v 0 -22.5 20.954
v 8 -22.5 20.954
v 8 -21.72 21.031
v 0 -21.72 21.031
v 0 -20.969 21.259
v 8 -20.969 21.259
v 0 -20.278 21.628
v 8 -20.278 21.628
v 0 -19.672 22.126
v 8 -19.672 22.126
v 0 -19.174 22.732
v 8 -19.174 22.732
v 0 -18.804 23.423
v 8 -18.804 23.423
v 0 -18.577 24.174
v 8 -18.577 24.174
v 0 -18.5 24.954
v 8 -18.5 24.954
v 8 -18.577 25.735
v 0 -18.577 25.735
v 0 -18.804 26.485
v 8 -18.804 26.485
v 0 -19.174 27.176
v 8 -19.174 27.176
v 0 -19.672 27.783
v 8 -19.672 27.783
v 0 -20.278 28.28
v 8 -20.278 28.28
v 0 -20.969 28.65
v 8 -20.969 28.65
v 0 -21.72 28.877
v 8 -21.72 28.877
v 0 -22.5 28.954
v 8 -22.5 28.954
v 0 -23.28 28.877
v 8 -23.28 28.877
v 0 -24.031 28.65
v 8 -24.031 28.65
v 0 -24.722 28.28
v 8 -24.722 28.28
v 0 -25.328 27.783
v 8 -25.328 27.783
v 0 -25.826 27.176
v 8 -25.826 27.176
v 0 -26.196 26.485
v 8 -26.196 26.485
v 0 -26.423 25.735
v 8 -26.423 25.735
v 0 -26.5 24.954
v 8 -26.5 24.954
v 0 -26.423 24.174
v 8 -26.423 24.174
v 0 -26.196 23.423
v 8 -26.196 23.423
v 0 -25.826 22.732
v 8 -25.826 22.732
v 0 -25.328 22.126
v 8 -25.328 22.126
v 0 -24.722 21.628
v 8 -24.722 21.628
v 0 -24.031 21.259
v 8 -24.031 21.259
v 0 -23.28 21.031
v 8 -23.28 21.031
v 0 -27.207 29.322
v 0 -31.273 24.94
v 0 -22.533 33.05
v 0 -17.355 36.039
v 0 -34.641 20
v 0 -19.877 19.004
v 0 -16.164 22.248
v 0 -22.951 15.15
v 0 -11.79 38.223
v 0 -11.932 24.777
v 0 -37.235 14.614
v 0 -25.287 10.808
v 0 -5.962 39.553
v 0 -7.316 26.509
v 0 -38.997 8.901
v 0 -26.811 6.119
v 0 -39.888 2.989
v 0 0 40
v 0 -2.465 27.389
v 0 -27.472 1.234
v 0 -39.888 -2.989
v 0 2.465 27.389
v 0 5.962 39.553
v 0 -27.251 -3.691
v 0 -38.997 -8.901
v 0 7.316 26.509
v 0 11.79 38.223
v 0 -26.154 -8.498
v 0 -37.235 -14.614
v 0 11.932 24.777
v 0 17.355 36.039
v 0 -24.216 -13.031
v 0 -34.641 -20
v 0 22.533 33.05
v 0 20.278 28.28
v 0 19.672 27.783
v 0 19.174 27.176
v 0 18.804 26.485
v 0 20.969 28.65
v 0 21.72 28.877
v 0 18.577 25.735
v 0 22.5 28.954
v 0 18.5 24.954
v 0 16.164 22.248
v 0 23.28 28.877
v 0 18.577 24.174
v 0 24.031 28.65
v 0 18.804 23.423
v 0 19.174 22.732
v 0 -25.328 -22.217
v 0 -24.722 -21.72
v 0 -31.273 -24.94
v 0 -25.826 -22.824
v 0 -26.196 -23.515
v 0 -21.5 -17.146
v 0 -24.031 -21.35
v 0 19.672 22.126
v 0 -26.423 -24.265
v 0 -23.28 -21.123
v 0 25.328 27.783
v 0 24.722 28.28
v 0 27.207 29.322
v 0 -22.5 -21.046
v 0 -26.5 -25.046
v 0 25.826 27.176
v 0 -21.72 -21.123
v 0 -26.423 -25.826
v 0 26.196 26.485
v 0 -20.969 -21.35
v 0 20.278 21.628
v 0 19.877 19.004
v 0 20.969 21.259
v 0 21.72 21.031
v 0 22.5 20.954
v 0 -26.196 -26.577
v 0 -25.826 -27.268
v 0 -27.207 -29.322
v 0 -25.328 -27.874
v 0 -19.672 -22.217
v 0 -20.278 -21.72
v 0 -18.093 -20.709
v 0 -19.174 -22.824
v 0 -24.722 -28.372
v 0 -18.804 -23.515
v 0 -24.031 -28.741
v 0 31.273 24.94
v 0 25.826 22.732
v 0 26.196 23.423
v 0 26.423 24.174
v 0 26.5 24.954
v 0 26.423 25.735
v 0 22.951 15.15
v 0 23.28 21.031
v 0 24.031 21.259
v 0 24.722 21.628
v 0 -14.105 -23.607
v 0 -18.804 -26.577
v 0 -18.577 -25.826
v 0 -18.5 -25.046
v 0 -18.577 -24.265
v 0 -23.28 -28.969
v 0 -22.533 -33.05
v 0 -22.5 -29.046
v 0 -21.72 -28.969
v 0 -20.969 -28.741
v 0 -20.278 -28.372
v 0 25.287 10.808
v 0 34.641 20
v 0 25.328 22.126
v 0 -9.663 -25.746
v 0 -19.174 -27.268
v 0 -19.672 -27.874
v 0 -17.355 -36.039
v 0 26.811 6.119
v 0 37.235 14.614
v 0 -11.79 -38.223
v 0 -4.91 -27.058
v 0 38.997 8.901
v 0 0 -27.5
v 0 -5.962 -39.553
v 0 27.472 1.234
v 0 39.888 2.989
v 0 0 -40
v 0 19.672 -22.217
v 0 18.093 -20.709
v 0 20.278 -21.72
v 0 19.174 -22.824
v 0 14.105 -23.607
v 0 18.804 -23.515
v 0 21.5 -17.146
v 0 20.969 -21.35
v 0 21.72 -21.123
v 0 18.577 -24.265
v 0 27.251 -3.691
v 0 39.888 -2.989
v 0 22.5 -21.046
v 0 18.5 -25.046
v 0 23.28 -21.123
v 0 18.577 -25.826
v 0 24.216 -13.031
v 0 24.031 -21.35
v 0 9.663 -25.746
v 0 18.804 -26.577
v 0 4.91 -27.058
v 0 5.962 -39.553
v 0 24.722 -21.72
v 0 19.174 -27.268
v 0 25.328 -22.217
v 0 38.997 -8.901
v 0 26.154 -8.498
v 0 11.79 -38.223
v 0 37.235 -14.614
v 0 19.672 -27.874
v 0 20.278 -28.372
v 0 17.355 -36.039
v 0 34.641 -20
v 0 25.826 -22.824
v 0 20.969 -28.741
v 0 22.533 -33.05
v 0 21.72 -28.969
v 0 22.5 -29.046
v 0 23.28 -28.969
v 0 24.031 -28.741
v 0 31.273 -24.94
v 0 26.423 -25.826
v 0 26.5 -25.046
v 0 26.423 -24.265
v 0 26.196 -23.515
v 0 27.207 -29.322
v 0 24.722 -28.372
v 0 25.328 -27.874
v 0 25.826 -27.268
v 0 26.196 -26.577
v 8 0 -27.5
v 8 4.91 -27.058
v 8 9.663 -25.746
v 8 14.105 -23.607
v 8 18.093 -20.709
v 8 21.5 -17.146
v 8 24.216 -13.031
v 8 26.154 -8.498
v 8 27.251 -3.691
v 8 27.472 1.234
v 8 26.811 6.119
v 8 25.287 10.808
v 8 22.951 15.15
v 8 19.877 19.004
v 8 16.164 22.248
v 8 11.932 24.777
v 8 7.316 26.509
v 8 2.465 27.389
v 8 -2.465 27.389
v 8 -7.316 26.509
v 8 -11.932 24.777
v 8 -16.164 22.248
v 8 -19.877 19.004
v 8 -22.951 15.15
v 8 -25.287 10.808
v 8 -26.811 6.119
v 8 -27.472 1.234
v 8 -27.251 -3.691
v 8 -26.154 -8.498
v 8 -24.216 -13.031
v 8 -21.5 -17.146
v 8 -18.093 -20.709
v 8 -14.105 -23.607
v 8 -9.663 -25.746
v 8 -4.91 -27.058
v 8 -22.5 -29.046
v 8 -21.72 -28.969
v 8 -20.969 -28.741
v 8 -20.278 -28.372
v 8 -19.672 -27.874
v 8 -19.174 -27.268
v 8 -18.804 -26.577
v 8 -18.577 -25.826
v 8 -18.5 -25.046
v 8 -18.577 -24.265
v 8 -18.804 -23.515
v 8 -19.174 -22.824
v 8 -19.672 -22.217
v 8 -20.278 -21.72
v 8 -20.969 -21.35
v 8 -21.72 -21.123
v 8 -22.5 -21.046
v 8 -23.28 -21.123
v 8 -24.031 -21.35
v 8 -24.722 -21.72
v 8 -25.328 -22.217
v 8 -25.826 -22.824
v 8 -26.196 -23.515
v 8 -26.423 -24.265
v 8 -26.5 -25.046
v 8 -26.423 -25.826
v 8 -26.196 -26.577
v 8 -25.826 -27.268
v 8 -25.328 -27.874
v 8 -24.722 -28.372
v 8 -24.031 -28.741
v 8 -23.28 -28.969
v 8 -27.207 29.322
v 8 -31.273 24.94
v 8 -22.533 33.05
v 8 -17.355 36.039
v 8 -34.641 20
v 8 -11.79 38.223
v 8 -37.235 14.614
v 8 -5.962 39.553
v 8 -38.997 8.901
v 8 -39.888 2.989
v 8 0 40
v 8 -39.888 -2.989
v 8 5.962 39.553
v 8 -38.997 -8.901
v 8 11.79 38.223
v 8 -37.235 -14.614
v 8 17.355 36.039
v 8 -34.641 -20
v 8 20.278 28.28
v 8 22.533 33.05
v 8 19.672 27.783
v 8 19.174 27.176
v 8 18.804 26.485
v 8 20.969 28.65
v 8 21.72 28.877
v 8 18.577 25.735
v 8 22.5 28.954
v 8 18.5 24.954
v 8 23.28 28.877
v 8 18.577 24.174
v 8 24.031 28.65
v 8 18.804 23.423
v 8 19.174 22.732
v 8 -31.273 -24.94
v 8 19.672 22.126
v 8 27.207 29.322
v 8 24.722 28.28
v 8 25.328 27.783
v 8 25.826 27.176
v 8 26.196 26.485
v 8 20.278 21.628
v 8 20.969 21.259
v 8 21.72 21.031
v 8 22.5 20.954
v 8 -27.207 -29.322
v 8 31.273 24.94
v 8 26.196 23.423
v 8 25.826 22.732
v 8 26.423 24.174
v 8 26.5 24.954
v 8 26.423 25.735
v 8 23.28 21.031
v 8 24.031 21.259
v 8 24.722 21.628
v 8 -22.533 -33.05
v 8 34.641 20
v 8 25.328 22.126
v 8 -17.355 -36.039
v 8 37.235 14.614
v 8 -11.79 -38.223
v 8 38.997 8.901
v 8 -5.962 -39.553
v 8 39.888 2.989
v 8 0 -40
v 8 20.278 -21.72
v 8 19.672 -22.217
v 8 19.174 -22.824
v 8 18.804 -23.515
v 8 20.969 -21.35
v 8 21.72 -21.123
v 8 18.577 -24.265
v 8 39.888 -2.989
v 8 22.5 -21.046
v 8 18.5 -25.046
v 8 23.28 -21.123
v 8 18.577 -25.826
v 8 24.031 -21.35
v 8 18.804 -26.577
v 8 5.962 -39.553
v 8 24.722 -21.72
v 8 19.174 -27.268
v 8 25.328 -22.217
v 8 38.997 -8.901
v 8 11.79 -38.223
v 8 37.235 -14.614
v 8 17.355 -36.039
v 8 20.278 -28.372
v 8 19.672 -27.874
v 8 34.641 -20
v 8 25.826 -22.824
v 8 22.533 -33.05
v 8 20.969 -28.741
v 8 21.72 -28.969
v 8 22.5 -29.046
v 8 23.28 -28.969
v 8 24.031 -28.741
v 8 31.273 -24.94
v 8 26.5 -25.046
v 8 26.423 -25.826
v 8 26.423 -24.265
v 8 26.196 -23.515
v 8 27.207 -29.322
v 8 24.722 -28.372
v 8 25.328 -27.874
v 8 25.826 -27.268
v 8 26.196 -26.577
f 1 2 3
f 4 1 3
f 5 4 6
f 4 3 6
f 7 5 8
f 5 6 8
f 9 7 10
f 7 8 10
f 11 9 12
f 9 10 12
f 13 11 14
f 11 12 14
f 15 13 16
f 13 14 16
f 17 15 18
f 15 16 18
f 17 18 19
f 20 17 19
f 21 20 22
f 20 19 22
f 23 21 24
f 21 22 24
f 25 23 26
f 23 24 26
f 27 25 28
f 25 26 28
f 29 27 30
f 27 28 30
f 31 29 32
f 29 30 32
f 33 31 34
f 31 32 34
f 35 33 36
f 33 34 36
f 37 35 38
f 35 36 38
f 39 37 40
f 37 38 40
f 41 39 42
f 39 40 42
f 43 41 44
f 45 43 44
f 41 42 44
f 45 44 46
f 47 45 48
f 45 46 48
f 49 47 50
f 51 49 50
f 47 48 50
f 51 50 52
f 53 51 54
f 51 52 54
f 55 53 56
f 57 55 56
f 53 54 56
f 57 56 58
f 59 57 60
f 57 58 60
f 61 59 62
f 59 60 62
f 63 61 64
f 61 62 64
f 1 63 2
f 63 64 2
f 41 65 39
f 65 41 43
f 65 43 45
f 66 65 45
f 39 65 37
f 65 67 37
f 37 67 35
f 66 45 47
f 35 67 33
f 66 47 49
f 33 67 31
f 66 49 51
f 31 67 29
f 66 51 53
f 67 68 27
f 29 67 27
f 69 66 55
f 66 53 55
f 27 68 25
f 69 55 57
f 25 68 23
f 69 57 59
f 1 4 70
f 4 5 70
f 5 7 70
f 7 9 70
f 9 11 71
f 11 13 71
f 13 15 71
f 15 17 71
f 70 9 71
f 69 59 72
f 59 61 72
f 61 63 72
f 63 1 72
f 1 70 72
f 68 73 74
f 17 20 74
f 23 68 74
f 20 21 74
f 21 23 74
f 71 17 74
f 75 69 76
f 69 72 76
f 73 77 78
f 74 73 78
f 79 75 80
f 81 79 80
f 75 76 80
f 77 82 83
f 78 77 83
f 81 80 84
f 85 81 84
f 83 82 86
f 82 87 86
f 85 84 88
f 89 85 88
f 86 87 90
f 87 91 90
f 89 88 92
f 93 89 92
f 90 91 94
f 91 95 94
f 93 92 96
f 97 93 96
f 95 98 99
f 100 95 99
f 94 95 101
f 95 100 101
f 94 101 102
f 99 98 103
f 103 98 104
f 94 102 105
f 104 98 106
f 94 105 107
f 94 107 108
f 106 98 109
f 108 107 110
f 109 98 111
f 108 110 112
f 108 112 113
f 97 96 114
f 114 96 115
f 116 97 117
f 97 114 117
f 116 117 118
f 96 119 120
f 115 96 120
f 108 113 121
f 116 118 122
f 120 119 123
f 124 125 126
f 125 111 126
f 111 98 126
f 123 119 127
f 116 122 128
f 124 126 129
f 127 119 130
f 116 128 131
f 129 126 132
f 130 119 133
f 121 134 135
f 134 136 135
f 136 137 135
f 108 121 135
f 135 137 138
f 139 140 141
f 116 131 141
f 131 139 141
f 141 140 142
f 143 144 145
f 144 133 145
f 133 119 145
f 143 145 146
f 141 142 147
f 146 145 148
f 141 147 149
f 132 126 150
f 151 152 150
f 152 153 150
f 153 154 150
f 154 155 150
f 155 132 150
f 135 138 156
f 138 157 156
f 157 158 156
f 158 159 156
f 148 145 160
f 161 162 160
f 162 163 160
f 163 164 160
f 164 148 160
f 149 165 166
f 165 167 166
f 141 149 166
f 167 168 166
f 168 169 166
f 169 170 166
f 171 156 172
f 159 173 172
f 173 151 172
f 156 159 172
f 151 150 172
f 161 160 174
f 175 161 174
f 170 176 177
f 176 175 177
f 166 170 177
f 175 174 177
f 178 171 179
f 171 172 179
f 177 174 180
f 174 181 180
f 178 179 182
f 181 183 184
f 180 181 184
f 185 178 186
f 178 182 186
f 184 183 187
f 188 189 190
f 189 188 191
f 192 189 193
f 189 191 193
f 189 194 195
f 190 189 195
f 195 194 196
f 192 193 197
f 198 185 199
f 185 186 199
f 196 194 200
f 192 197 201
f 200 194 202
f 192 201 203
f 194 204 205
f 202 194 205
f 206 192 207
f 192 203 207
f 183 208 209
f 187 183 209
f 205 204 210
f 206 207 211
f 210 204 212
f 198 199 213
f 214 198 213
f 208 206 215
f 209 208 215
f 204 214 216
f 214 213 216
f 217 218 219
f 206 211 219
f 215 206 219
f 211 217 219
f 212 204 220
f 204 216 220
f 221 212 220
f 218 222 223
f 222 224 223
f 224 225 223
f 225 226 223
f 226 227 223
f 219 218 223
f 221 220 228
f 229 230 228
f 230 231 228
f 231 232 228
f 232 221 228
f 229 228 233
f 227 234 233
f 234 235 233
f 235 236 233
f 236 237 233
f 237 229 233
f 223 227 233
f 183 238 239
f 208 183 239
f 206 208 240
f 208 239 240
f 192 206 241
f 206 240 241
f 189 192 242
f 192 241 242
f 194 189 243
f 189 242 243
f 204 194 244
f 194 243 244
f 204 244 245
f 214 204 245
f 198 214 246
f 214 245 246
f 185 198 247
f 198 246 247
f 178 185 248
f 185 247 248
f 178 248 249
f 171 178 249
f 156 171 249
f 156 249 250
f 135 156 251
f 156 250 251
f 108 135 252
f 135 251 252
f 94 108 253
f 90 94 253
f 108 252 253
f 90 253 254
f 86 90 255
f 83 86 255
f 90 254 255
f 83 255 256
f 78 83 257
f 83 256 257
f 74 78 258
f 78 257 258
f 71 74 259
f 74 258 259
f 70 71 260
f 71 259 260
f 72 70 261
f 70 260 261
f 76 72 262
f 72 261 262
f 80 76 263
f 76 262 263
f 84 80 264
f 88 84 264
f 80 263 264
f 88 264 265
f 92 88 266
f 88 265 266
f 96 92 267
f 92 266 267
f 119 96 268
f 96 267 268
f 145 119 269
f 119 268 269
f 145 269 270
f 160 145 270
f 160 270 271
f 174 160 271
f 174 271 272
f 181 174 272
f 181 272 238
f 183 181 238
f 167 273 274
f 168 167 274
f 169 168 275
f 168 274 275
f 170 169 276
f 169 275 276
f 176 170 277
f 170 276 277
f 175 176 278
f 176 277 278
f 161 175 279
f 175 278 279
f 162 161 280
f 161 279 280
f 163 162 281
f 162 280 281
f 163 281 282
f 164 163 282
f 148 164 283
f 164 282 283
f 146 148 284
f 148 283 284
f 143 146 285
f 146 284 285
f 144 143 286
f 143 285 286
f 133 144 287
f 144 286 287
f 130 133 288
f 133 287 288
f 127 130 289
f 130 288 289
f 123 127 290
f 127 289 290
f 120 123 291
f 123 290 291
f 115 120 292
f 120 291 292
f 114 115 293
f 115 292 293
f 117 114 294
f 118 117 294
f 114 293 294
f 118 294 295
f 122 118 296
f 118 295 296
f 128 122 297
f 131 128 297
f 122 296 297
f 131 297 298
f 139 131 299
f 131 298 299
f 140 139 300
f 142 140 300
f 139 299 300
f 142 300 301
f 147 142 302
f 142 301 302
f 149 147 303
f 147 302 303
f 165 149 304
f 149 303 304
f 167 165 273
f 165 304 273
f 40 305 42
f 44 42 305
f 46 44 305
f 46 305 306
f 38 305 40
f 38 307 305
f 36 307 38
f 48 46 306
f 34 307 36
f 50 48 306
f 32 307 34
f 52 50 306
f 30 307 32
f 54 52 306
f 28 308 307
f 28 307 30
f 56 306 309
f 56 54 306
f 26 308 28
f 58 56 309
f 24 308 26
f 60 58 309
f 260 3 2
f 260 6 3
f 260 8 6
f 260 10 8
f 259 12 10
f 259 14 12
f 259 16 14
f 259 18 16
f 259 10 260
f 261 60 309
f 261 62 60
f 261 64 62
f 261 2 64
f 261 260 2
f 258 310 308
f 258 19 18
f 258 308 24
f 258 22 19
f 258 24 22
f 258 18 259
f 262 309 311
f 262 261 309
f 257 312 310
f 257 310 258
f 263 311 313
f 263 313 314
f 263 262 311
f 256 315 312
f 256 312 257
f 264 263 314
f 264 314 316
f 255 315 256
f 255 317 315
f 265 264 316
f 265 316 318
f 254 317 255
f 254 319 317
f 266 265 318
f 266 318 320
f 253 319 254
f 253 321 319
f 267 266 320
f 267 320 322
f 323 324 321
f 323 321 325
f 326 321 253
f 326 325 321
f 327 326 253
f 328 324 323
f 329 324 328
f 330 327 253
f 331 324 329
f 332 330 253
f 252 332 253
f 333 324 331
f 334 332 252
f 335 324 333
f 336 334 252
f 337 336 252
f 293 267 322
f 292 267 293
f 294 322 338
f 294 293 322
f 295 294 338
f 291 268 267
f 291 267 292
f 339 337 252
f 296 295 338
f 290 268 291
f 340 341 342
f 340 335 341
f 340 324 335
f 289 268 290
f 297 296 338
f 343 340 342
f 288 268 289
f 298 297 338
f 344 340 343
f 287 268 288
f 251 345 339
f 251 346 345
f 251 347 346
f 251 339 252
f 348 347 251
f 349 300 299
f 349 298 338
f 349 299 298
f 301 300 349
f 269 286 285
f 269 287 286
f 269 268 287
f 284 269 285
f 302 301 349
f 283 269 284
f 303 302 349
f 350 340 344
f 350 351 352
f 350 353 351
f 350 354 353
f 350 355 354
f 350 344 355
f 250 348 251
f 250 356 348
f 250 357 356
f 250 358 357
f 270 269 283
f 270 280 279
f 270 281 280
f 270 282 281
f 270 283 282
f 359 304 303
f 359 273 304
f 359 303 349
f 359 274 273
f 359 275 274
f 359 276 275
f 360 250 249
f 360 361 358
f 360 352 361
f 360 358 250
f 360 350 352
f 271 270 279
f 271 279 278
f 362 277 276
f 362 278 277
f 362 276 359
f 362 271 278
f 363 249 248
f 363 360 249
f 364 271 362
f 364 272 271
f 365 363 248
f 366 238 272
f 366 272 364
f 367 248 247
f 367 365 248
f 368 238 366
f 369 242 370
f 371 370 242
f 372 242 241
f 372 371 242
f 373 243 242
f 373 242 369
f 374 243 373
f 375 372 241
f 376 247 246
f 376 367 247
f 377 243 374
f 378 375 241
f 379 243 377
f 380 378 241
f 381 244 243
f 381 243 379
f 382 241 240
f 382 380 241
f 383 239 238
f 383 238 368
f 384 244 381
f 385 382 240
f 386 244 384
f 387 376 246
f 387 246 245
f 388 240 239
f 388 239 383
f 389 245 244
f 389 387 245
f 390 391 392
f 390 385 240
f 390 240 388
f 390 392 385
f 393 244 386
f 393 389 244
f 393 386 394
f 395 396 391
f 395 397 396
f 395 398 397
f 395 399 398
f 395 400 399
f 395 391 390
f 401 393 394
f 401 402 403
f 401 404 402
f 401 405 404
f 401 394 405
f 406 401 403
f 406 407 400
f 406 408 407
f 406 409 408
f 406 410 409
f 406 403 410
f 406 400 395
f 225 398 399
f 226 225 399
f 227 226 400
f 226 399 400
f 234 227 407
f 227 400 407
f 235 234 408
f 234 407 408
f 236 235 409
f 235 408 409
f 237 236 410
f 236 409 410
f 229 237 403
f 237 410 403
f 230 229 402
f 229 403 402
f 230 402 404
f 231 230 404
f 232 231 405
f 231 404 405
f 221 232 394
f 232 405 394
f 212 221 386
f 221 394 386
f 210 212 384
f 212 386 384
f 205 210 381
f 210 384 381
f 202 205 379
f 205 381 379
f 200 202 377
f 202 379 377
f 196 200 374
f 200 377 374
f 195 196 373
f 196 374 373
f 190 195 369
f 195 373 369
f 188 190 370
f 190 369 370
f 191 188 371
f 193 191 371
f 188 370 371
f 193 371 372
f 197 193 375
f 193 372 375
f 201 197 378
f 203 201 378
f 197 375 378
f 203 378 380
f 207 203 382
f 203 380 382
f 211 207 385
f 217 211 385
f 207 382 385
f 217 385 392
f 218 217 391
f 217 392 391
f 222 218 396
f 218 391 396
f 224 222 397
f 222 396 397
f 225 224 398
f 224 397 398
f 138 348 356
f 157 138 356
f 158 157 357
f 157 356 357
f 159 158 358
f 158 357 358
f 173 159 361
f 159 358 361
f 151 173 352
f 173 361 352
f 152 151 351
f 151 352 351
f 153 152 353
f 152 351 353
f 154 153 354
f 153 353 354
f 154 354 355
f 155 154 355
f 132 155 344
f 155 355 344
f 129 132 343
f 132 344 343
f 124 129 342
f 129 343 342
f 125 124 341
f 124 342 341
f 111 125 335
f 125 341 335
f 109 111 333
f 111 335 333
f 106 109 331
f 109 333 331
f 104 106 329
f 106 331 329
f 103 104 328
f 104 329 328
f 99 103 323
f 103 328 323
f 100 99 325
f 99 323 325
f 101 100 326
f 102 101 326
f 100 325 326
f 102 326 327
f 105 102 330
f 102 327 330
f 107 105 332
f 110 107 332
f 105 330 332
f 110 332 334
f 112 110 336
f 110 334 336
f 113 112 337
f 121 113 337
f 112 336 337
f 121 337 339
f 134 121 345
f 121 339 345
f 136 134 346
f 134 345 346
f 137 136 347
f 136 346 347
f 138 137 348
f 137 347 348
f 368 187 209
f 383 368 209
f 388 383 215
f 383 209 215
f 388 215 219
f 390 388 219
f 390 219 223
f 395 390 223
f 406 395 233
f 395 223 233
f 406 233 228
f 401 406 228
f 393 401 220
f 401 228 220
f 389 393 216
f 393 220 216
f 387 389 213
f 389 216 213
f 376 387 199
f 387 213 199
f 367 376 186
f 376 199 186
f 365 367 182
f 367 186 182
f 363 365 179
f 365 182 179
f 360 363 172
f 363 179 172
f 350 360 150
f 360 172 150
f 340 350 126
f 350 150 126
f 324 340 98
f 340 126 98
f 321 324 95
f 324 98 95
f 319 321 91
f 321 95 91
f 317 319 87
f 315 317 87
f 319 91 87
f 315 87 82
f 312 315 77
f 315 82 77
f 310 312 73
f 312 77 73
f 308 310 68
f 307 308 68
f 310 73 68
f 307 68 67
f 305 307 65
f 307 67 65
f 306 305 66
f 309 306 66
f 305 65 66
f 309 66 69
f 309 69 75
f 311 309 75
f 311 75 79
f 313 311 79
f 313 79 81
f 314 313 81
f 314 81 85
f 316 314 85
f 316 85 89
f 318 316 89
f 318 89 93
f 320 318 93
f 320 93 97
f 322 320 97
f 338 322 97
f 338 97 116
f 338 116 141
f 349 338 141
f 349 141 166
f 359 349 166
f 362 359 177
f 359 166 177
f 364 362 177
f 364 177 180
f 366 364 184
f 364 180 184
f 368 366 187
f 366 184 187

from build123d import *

# Parameters (mm, degrees)
SKETCH1_R           = 40
BOSS_EXTRUDE1_DEPTH = 8
SKETCH3_R           = 4
SKETCH3_R_2         = 4.000000002
CUT_EXTRUDE1_DEPTH  = 8
SKETCH4_R           = 27.5
CUT_EXTRUDE2_DEPTH  = 8


with BuildPart() as part:
    # Sketch1 → Boss-Extrude1 (new body)
    with BuildSketch(Plane(origin=(0, 0, 0), x_dir=(0, 0, -1), z_dir=(1, 0, 0))):
        Circle(SKETCH1_R)
    extrude(amount=BOSS_EXTRUDE1_DEPTH)

    # Sketch3 → Cut-Extrude1 (cut)
    with BuildSketch(Plane(origin=(8, 0, 0), x_dir=(0, 0, -1), z_dir=(1, 0, 0))):
        with Locations((-24.95415797, 22.5)):
            Circle(SKETCH3_R)
        with Locations((25.04584203, 22.500000005)):
            Circle(SKETCH3_R_2)
        with Locations((-24.95415797, -22.5)):
            Circle(SKETCH3_R)
        with Locations((25.04584203, -22.500000005)):
            Circle(SKETCH3_R_2)
    extrude(amount=-CUT_EXTRUDE1_DEPTH, mode=Mode.SUBTRACT)

    # Sketch4 → Cut-Extrude2 (cut)
    with BuildSketch(Plane(origin=(8, 0, 0), x_dir=(0, 0, -1), z_dir=(1, 0, 0))):
        Circle(SKETCH4_R)
    extrude(amount=-CUT_EXTRUDE2_DEPTH, mode=Mode.SUBTRACT)


solid = part.part
